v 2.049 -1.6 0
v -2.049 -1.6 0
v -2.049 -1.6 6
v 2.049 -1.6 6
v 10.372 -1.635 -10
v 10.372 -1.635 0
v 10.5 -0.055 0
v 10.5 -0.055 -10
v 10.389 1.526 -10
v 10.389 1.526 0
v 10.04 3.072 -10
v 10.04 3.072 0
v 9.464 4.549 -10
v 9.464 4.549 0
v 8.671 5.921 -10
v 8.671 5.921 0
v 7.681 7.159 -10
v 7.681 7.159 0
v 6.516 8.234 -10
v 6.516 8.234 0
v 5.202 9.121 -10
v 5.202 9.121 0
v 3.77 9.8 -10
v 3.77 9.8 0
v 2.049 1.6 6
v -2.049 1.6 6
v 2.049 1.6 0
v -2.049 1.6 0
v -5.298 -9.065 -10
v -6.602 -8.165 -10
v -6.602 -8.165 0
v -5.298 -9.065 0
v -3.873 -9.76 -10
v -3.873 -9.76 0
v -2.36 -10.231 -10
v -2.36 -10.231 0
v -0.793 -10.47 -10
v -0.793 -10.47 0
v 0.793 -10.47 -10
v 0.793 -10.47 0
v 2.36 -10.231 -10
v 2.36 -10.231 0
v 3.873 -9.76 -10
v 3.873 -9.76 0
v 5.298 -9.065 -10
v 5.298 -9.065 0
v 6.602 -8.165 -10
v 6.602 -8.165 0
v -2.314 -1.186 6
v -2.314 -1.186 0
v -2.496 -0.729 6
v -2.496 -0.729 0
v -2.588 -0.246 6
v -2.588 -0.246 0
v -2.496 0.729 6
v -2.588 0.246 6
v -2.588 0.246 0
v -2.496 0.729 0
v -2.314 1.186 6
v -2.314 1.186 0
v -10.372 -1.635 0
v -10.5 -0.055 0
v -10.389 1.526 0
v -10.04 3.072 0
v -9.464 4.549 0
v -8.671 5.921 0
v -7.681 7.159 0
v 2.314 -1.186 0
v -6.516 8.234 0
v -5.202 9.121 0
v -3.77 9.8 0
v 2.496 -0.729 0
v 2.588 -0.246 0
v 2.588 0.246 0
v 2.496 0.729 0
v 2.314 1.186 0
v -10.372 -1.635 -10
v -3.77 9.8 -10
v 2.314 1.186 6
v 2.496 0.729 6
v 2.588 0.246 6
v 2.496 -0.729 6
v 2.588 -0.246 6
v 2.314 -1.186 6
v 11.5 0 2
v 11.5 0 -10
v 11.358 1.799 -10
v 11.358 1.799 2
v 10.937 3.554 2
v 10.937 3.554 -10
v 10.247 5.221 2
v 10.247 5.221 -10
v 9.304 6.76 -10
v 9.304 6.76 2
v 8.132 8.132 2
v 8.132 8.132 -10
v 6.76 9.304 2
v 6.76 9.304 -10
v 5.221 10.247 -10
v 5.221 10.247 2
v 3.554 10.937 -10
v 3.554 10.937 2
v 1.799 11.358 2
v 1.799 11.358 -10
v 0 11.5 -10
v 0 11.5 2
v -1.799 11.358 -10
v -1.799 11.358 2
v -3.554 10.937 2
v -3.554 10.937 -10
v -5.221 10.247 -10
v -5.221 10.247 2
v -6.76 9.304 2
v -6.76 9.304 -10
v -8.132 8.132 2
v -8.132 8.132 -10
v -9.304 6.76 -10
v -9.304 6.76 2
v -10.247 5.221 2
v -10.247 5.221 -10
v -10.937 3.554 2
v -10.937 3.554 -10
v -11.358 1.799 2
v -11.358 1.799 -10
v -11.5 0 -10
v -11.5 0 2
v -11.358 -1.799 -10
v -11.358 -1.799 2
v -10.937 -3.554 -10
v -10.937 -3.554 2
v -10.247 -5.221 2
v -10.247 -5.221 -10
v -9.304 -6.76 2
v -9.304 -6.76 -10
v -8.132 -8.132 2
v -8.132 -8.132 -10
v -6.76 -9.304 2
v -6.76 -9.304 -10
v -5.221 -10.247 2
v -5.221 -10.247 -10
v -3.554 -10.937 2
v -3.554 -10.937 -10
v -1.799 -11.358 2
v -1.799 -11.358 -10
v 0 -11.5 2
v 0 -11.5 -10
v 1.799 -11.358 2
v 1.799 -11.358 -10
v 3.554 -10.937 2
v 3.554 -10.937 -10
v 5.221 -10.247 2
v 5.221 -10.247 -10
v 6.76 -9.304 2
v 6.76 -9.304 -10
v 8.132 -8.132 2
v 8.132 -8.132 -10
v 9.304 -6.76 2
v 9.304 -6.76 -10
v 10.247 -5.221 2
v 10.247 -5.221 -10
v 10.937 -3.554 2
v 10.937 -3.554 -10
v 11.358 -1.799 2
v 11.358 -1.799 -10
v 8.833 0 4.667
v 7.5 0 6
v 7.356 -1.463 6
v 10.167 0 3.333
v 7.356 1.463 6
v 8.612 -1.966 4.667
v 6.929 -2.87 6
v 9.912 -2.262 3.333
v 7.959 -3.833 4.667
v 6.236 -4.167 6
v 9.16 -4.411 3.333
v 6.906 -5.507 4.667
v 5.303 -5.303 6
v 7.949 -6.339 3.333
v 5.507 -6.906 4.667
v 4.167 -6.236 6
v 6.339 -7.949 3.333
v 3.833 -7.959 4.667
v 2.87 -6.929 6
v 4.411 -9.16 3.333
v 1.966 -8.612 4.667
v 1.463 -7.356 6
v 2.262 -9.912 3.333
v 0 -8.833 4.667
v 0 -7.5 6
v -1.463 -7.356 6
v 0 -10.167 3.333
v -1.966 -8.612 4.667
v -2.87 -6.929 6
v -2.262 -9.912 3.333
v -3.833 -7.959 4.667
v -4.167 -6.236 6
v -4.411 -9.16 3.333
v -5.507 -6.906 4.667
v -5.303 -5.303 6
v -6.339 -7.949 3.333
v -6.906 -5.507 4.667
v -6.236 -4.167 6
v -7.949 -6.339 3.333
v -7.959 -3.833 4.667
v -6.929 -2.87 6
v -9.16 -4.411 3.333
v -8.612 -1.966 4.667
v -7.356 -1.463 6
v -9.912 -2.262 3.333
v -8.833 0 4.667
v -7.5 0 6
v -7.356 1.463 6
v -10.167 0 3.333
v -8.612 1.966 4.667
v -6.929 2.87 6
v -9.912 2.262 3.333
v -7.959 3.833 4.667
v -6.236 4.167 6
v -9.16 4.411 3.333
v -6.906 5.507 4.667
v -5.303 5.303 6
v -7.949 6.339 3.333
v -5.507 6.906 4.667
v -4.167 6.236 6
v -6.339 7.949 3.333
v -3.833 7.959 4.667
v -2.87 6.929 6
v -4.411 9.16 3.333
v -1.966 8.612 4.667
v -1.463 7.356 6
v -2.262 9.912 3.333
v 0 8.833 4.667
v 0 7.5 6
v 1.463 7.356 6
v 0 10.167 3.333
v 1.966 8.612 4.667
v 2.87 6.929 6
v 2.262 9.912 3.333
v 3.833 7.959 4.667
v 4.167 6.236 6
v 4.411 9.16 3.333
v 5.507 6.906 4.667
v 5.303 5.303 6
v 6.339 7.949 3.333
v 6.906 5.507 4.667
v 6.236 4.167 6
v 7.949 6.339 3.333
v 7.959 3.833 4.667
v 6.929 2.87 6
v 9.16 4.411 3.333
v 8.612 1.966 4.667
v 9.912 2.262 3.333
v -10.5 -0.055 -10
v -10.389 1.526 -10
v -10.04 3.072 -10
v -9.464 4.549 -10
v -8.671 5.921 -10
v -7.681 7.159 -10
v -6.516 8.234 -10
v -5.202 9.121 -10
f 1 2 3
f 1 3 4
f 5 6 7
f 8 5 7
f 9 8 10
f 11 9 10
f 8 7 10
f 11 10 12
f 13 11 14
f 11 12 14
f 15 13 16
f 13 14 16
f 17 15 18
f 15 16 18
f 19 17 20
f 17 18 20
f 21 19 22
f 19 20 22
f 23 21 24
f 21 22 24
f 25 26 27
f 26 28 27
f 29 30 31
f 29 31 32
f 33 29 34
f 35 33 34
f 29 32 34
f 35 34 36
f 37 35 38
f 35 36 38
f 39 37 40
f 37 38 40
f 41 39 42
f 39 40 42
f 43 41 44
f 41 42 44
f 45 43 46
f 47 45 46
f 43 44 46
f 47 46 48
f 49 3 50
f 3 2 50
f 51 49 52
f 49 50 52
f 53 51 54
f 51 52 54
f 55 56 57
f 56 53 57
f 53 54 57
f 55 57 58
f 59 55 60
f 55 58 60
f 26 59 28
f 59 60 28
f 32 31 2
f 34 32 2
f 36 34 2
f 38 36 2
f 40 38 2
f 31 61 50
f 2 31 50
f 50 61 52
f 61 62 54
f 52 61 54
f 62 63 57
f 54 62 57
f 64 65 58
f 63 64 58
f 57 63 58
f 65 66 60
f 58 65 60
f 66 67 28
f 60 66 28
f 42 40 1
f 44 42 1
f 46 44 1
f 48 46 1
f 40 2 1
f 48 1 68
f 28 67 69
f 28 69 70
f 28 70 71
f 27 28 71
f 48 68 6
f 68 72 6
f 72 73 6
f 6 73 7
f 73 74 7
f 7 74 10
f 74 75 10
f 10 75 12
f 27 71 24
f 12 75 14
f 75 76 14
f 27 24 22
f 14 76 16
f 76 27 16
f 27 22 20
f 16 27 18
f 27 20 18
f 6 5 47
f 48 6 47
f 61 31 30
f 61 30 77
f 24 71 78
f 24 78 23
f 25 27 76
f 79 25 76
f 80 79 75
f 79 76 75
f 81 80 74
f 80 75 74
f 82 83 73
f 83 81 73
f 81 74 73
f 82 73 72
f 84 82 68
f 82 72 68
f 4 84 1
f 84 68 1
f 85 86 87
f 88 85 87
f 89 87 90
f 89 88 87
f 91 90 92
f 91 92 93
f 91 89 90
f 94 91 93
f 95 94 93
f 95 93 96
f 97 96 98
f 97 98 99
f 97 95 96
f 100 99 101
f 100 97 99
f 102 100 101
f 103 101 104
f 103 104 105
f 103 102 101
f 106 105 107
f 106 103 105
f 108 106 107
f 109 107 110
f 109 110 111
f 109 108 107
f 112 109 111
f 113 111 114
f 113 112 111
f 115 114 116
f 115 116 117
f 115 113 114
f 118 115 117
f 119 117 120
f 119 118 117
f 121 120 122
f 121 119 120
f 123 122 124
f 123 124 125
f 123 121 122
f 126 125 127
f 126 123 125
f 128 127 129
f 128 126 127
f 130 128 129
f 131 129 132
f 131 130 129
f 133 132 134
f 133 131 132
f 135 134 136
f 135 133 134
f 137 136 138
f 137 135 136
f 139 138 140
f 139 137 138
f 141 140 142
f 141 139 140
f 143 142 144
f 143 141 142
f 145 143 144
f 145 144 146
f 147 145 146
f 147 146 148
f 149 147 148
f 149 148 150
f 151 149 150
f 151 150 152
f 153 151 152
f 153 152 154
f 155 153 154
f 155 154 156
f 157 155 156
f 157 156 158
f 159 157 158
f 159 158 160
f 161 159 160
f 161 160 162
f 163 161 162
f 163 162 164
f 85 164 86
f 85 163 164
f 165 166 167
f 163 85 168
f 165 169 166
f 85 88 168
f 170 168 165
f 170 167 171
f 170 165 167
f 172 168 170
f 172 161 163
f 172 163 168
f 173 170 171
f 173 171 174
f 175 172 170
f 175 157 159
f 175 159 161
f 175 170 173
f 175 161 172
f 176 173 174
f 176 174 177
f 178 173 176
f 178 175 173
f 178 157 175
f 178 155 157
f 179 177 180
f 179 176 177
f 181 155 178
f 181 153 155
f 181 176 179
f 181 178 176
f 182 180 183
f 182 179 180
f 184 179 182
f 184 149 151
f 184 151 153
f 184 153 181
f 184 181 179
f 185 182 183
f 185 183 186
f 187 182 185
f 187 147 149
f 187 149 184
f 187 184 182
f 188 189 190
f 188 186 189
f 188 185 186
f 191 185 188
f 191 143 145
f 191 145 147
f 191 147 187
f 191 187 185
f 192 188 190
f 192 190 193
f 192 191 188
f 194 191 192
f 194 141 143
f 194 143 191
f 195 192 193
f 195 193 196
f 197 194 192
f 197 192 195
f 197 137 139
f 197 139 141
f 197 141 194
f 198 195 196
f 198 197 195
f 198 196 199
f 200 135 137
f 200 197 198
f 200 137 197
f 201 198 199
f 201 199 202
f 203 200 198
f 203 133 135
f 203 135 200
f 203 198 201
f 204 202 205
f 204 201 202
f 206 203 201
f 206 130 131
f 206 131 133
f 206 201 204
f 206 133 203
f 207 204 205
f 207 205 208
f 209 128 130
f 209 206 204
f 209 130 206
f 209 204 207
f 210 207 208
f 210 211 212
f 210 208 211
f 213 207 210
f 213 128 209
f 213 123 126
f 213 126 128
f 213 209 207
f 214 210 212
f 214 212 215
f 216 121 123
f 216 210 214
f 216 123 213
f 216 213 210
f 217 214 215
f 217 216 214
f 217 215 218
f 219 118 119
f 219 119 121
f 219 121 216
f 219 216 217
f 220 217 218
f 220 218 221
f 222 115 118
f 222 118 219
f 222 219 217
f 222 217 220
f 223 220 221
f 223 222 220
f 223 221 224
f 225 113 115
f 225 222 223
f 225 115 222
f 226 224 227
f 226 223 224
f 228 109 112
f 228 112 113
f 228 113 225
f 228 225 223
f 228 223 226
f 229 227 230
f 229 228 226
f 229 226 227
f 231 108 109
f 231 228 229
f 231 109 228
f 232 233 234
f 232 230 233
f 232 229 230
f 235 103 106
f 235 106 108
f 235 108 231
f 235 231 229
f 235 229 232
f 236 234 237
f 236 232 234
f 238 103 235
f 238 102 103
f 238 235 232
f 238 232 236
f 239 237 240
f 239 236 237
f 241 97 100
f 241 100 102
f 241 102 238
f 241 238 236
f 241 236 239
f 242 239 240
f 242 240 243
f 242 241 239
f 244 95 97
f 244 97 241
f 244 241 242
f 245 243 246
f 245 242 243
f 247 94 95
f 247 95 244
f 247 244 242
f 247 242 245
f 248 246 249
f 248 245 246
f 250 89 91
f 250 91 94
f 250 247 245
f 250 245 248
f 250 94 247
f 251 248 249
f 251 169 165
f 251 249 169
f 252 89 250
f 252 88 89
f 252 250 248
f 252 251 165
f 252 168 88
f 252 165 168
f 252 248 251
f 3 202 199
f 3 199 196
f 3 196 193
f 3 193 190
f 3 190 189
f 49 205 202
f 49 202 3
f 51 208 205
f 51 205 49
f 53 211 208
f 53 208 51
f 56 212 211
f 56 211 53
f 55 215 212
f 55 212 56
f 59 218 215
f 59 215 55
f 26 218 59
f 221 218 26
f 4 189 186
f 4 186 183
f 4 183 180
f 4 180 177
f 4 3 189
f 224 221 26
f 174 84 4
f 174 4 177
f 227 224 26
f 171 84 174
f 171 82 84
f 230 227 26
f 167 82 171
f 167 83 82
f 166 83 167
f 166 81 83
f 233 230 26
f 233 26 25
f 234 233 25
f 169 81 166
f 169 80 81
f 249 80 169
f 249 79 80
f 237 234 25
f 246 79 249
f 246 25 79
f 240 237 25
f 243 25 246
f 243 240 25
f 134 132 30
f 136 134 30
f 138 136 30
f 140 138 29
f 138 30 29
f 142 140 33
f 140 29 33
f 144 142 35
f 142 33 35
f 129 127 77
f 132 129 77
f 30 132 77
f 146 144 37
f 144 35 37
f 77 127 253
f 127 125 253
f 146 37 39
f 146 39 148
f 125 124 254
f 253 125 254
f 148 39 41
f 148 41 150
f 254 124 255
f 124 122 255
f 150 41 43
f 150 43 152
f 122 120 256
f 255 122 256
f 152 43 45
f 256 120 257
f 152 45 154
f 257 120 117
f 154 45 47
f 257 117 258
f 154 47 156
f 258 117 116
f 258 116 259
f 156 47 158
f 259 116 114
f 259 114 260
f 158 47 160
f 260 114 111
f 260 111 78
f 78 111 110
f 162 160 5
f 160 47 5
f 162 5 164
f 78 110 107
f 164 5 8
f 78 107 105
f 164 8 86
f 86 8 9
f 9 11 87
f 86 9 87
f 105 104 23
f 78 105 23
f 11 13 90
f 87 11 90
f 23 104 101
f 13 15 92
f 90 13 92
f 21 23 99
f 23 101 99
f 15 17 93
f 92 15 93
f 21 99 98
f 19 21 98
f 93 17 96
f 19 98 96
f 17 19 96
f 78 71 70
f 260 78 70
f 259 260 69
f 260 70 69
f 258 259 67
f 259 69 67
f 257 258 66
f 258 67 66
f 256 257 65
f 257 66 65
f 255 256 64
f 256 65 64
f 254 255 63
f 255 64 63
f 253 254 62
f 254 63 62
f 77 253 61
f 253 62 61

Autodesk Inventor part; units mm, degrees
ref_plane "YZ Plane" through (0, 0, 0) normal (1, 0, 0) x (0, 1, 0)
ref_plane "XZ Plane" through (0, 0, 0) normal (0, 1, 0) x (-1, 0, 0)
ref_plane "XY Plane" through (0, 0, 0) normal (0, 0, 1) x (1, 0, 0)
sketch "Sketch1" plane through (0, 0, 0) normal (0, 0, 1) x (1, 0, 0)
  circle A0 centre (0, 0) radius 10 construction
  circle A1 centre (0, 0) radius 11.5
  arc A2 (-3.7696, 9.8) -> (3.7696, 9.8) centre (0, 0) ccw
  line L0 (-3.7696, 9.8) -> (3.7696, 9.8)
  point P0 (0, 0)
  dimension "d0" = 23
  dimension "d1" = 21
  dimension "d2" = 9.8
extrude "Extrusion1" add sketch "Sketch1" against normal blind 10
pattern_circular "Circular Pattern1" count 3 over 360 about axis through (0, 0, 0) along (0, 0, -1) of "Extrusion1"
sketch "Sketch2" plane through (0, 0, 0) normal (0, 0, 1) x (1, 0, 0)
  circle A0 centre (0, 0) radius 11.5 projected
  line L0 (-3.7696, 9.8) -> (3.7696, 9.8) projected
  arc A1 (10.3719, -1.6354) -> (3.7696, 9.8) centre (0, 0) ccw projected
  line L1 (10.3719, -1.6354) -> (6.6022, -8.1646) projected
  arc A2 (-6.6022, -8.1646) -> (6.6022, -8.1646) centre (0, 0) ccw projected
  line L2 (-6.6022, -8.1646) -> (-10.3719, -1.6354) projected
  arc A3 (-3.7696, 9.8) -> (-10.3719, -1.6354) centre (0, 0) ccw projected
  line L3 (-2, -1.5) -> (2, -1.5) projected
  line L4 (2, 1.5) -> (-2, 1.5) projected
  arc A4 (-2.5, 0) -> (2.5, 0) centre (0, 0) ccw construction
  line L5 (-2.0494, -1.6) -> (2.0494, -1.6)
  line L6 (-2.0494, 1.6) -> (2.0857, 1.6)
  arc A5 (2.0494, -1.6) -> (2.0494, 1.6) centre (0, 0) ccw
  arc A6 (-2.0494, 1.6) -> (-2.0494, -1.6) centre (0, 0) ccw
  point P0 (0, 0)
  dimension "d11" = 0.1
  dimension "d12" = 0.1
extrude "Extrusion2" add sketch "Sketch2" along normal blind 6 contours A0 | L0 A1 L1 A2 L2 A3
chamfer "Chamfer1" distance 4 angle 45 1 edges at (-11.5, 0, 6)
properties part number "02_WG_writer_clutch"
